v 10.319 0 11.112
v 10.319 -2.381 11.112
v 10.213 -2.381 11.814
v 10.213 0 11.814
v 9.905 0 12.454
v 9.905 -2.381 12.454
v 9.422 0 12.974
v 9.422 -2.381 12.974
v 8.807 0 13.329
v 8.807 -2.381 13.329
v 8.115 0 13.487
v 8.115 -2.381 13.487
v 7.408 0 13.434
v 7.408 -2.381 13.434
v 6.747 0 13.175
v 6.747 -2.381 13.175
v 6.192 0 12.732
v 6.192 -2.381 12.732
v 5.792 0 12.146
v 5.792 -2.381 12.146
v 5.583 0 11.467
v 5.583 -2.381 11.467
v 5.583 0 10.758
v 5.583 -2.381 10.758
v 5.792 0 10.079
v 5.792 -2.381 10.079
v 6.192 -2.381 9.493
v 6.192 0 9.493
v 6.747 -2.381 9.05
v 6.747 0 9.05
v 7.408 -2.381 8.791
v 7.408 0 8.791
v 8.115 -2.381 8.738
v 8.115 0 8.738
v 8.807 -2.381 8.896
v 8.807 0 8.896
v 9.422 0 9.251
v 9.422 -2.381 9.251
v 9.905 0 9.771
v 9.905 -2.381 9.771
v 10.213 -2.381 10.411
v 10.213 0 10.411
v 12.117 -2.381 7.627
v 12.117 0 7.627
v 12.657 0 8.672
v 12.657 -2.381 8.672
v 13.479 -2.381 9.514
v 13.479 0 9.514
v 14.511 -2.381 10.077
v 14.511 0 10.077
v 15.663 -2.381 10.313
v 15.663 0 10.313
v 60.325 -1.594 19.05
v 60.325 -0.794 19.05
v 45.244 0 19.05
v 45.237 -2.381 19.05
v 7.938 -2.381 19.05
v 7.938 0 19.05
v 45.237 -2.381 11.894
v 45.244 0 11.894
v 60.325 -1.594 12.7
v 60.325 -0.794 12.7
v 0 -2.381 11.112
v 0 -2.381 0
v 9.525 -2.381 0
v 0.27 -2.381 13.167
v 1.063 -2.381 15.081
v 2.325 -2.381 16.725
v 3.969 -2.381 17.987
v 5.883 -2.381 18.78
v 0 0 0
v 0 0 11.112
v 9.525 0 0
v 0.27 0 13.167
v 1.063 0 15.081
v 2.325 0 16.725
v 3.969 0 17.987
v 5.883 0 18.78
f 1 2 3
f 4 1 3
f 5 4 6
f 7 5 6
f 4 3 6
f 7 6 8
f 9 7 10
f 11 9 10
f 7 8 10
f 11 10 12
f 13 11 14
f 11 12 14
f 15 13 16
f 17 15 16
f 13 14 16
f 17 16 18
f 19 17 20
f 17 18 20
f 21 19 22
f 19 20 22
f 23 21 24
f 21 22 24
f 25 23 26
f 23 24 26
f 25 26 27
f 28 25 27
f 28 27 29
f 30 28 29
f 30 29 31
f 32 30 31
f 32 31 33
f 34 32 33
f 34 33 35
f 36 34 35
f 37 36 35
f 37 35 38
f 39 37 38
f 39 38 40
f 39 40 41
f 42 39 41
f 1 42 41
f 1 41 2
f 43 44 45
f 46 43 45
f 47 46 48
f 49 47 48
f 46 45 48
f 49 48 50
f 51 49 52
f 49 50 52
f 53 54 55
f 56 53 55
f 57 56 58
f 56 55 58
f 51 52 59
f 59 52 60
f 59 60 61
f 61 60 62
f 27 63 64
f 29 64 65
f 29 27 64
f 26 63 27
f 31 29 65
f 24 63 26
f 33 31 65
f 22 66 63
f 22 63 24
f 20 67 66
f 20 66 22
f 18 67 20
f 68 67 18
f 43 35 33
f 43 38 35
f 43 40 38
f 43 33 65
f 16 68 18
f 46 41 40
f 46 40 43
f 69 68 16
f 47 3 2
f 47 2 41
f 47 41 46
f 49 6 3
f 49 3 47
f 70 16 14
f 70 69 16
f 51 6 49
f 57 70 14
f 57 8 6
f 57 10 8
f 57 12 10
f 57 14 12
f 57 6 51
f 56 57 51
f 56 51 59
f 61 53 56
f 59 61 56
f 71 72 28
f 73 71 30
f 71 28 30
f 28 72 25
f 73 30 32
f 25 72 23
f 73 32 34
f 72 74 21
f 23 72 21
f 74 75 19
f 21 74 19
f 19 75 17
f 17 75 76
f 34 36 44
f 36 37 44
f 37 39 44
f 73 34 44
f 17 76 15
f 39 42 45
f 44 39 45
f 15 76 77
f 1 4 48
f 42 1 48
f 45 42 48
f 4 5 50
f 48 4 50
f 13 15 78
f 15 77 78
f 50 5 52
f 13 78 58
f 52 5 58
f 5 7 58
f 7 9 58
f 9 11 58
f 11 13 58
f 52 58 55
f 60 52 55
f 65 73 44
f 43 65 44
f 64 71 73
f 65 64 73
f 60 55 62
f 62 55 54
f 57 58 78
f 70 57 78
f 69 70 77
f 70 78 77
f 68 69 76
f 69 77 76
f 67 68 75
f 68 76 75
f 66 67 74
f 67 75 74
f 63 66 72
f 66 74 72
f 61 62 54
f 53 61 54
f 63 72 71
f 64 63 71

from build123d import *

# Parameters (mm, degrees)
F1_DEPTH = 2.38125
F2_R     = 2.38125
F3_DEPTH = 25.4
F5_DEPTH = 25.4


with BuildPart() as f1:
    # F0 (on Front) → F1 (new body)
    with BuildSketch(Plane.XZ):
        with BuildLine():
            Line((60.325, 19.05), (7.9375, 19.05))
            ThreePointArc((7.9375, 19.05), (2.32484, 16.72516), (0, 11.1125))
            Line((0, 11.1125), (0, 0))
            Line((0, 0), (9.525, 0))
            Line((9.525, 0), (12.117365, 7.627166))
            ThreePointArc((12.117365, 7.627166), (13.478615, 9.513592), (15.663196, 10.313094))
            Line((15.663196, 10.313094), (60.325, 12.7))
            Line((60.325, 12.7), (60.325, 19.05))
        make_face()
    extrude(amount=F1_DEPTH)

    # F2 (on face) → F3 (cut)
    with BuildSketch(Plane.XZ.offset(2.38125)):
        with Locations((7.9375, 11.1125)):
            Circle(F2_R)
    extrude(amount=-F3_DEPTH, mode=Mode.SUBTRACT)

    # F4 (on face) → F5 (cut)
    with BuildSketch(Plane.XY.offset(19.05)):
        Polygon((60.325, -2.38125), (60.325, -1.59385), (45.2374, -2.38125), align=None)
        Polygon((60.325, 0), (45.24375, 0), (60.325, -0.79375), align=None)
    extrude(amount=-F5_DEPTH, mode=Mode.SUBTRACT)


solid = f1.part
